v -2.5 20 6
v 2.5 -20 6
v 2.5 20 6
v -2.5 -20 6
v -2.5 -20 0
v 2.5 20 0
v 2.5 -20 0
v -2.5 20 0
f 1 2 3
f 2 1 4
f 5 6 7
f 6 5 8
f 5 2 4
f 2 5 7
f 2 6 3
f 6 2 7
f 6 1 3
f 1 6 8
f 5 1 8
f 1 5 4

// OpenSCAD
// brick 1x8

// external vars #########################

// part ##################################`

module brick_1x8() { translate([-2.5,-20,0]) cube([5,40,6]); }

brick_1x8();
